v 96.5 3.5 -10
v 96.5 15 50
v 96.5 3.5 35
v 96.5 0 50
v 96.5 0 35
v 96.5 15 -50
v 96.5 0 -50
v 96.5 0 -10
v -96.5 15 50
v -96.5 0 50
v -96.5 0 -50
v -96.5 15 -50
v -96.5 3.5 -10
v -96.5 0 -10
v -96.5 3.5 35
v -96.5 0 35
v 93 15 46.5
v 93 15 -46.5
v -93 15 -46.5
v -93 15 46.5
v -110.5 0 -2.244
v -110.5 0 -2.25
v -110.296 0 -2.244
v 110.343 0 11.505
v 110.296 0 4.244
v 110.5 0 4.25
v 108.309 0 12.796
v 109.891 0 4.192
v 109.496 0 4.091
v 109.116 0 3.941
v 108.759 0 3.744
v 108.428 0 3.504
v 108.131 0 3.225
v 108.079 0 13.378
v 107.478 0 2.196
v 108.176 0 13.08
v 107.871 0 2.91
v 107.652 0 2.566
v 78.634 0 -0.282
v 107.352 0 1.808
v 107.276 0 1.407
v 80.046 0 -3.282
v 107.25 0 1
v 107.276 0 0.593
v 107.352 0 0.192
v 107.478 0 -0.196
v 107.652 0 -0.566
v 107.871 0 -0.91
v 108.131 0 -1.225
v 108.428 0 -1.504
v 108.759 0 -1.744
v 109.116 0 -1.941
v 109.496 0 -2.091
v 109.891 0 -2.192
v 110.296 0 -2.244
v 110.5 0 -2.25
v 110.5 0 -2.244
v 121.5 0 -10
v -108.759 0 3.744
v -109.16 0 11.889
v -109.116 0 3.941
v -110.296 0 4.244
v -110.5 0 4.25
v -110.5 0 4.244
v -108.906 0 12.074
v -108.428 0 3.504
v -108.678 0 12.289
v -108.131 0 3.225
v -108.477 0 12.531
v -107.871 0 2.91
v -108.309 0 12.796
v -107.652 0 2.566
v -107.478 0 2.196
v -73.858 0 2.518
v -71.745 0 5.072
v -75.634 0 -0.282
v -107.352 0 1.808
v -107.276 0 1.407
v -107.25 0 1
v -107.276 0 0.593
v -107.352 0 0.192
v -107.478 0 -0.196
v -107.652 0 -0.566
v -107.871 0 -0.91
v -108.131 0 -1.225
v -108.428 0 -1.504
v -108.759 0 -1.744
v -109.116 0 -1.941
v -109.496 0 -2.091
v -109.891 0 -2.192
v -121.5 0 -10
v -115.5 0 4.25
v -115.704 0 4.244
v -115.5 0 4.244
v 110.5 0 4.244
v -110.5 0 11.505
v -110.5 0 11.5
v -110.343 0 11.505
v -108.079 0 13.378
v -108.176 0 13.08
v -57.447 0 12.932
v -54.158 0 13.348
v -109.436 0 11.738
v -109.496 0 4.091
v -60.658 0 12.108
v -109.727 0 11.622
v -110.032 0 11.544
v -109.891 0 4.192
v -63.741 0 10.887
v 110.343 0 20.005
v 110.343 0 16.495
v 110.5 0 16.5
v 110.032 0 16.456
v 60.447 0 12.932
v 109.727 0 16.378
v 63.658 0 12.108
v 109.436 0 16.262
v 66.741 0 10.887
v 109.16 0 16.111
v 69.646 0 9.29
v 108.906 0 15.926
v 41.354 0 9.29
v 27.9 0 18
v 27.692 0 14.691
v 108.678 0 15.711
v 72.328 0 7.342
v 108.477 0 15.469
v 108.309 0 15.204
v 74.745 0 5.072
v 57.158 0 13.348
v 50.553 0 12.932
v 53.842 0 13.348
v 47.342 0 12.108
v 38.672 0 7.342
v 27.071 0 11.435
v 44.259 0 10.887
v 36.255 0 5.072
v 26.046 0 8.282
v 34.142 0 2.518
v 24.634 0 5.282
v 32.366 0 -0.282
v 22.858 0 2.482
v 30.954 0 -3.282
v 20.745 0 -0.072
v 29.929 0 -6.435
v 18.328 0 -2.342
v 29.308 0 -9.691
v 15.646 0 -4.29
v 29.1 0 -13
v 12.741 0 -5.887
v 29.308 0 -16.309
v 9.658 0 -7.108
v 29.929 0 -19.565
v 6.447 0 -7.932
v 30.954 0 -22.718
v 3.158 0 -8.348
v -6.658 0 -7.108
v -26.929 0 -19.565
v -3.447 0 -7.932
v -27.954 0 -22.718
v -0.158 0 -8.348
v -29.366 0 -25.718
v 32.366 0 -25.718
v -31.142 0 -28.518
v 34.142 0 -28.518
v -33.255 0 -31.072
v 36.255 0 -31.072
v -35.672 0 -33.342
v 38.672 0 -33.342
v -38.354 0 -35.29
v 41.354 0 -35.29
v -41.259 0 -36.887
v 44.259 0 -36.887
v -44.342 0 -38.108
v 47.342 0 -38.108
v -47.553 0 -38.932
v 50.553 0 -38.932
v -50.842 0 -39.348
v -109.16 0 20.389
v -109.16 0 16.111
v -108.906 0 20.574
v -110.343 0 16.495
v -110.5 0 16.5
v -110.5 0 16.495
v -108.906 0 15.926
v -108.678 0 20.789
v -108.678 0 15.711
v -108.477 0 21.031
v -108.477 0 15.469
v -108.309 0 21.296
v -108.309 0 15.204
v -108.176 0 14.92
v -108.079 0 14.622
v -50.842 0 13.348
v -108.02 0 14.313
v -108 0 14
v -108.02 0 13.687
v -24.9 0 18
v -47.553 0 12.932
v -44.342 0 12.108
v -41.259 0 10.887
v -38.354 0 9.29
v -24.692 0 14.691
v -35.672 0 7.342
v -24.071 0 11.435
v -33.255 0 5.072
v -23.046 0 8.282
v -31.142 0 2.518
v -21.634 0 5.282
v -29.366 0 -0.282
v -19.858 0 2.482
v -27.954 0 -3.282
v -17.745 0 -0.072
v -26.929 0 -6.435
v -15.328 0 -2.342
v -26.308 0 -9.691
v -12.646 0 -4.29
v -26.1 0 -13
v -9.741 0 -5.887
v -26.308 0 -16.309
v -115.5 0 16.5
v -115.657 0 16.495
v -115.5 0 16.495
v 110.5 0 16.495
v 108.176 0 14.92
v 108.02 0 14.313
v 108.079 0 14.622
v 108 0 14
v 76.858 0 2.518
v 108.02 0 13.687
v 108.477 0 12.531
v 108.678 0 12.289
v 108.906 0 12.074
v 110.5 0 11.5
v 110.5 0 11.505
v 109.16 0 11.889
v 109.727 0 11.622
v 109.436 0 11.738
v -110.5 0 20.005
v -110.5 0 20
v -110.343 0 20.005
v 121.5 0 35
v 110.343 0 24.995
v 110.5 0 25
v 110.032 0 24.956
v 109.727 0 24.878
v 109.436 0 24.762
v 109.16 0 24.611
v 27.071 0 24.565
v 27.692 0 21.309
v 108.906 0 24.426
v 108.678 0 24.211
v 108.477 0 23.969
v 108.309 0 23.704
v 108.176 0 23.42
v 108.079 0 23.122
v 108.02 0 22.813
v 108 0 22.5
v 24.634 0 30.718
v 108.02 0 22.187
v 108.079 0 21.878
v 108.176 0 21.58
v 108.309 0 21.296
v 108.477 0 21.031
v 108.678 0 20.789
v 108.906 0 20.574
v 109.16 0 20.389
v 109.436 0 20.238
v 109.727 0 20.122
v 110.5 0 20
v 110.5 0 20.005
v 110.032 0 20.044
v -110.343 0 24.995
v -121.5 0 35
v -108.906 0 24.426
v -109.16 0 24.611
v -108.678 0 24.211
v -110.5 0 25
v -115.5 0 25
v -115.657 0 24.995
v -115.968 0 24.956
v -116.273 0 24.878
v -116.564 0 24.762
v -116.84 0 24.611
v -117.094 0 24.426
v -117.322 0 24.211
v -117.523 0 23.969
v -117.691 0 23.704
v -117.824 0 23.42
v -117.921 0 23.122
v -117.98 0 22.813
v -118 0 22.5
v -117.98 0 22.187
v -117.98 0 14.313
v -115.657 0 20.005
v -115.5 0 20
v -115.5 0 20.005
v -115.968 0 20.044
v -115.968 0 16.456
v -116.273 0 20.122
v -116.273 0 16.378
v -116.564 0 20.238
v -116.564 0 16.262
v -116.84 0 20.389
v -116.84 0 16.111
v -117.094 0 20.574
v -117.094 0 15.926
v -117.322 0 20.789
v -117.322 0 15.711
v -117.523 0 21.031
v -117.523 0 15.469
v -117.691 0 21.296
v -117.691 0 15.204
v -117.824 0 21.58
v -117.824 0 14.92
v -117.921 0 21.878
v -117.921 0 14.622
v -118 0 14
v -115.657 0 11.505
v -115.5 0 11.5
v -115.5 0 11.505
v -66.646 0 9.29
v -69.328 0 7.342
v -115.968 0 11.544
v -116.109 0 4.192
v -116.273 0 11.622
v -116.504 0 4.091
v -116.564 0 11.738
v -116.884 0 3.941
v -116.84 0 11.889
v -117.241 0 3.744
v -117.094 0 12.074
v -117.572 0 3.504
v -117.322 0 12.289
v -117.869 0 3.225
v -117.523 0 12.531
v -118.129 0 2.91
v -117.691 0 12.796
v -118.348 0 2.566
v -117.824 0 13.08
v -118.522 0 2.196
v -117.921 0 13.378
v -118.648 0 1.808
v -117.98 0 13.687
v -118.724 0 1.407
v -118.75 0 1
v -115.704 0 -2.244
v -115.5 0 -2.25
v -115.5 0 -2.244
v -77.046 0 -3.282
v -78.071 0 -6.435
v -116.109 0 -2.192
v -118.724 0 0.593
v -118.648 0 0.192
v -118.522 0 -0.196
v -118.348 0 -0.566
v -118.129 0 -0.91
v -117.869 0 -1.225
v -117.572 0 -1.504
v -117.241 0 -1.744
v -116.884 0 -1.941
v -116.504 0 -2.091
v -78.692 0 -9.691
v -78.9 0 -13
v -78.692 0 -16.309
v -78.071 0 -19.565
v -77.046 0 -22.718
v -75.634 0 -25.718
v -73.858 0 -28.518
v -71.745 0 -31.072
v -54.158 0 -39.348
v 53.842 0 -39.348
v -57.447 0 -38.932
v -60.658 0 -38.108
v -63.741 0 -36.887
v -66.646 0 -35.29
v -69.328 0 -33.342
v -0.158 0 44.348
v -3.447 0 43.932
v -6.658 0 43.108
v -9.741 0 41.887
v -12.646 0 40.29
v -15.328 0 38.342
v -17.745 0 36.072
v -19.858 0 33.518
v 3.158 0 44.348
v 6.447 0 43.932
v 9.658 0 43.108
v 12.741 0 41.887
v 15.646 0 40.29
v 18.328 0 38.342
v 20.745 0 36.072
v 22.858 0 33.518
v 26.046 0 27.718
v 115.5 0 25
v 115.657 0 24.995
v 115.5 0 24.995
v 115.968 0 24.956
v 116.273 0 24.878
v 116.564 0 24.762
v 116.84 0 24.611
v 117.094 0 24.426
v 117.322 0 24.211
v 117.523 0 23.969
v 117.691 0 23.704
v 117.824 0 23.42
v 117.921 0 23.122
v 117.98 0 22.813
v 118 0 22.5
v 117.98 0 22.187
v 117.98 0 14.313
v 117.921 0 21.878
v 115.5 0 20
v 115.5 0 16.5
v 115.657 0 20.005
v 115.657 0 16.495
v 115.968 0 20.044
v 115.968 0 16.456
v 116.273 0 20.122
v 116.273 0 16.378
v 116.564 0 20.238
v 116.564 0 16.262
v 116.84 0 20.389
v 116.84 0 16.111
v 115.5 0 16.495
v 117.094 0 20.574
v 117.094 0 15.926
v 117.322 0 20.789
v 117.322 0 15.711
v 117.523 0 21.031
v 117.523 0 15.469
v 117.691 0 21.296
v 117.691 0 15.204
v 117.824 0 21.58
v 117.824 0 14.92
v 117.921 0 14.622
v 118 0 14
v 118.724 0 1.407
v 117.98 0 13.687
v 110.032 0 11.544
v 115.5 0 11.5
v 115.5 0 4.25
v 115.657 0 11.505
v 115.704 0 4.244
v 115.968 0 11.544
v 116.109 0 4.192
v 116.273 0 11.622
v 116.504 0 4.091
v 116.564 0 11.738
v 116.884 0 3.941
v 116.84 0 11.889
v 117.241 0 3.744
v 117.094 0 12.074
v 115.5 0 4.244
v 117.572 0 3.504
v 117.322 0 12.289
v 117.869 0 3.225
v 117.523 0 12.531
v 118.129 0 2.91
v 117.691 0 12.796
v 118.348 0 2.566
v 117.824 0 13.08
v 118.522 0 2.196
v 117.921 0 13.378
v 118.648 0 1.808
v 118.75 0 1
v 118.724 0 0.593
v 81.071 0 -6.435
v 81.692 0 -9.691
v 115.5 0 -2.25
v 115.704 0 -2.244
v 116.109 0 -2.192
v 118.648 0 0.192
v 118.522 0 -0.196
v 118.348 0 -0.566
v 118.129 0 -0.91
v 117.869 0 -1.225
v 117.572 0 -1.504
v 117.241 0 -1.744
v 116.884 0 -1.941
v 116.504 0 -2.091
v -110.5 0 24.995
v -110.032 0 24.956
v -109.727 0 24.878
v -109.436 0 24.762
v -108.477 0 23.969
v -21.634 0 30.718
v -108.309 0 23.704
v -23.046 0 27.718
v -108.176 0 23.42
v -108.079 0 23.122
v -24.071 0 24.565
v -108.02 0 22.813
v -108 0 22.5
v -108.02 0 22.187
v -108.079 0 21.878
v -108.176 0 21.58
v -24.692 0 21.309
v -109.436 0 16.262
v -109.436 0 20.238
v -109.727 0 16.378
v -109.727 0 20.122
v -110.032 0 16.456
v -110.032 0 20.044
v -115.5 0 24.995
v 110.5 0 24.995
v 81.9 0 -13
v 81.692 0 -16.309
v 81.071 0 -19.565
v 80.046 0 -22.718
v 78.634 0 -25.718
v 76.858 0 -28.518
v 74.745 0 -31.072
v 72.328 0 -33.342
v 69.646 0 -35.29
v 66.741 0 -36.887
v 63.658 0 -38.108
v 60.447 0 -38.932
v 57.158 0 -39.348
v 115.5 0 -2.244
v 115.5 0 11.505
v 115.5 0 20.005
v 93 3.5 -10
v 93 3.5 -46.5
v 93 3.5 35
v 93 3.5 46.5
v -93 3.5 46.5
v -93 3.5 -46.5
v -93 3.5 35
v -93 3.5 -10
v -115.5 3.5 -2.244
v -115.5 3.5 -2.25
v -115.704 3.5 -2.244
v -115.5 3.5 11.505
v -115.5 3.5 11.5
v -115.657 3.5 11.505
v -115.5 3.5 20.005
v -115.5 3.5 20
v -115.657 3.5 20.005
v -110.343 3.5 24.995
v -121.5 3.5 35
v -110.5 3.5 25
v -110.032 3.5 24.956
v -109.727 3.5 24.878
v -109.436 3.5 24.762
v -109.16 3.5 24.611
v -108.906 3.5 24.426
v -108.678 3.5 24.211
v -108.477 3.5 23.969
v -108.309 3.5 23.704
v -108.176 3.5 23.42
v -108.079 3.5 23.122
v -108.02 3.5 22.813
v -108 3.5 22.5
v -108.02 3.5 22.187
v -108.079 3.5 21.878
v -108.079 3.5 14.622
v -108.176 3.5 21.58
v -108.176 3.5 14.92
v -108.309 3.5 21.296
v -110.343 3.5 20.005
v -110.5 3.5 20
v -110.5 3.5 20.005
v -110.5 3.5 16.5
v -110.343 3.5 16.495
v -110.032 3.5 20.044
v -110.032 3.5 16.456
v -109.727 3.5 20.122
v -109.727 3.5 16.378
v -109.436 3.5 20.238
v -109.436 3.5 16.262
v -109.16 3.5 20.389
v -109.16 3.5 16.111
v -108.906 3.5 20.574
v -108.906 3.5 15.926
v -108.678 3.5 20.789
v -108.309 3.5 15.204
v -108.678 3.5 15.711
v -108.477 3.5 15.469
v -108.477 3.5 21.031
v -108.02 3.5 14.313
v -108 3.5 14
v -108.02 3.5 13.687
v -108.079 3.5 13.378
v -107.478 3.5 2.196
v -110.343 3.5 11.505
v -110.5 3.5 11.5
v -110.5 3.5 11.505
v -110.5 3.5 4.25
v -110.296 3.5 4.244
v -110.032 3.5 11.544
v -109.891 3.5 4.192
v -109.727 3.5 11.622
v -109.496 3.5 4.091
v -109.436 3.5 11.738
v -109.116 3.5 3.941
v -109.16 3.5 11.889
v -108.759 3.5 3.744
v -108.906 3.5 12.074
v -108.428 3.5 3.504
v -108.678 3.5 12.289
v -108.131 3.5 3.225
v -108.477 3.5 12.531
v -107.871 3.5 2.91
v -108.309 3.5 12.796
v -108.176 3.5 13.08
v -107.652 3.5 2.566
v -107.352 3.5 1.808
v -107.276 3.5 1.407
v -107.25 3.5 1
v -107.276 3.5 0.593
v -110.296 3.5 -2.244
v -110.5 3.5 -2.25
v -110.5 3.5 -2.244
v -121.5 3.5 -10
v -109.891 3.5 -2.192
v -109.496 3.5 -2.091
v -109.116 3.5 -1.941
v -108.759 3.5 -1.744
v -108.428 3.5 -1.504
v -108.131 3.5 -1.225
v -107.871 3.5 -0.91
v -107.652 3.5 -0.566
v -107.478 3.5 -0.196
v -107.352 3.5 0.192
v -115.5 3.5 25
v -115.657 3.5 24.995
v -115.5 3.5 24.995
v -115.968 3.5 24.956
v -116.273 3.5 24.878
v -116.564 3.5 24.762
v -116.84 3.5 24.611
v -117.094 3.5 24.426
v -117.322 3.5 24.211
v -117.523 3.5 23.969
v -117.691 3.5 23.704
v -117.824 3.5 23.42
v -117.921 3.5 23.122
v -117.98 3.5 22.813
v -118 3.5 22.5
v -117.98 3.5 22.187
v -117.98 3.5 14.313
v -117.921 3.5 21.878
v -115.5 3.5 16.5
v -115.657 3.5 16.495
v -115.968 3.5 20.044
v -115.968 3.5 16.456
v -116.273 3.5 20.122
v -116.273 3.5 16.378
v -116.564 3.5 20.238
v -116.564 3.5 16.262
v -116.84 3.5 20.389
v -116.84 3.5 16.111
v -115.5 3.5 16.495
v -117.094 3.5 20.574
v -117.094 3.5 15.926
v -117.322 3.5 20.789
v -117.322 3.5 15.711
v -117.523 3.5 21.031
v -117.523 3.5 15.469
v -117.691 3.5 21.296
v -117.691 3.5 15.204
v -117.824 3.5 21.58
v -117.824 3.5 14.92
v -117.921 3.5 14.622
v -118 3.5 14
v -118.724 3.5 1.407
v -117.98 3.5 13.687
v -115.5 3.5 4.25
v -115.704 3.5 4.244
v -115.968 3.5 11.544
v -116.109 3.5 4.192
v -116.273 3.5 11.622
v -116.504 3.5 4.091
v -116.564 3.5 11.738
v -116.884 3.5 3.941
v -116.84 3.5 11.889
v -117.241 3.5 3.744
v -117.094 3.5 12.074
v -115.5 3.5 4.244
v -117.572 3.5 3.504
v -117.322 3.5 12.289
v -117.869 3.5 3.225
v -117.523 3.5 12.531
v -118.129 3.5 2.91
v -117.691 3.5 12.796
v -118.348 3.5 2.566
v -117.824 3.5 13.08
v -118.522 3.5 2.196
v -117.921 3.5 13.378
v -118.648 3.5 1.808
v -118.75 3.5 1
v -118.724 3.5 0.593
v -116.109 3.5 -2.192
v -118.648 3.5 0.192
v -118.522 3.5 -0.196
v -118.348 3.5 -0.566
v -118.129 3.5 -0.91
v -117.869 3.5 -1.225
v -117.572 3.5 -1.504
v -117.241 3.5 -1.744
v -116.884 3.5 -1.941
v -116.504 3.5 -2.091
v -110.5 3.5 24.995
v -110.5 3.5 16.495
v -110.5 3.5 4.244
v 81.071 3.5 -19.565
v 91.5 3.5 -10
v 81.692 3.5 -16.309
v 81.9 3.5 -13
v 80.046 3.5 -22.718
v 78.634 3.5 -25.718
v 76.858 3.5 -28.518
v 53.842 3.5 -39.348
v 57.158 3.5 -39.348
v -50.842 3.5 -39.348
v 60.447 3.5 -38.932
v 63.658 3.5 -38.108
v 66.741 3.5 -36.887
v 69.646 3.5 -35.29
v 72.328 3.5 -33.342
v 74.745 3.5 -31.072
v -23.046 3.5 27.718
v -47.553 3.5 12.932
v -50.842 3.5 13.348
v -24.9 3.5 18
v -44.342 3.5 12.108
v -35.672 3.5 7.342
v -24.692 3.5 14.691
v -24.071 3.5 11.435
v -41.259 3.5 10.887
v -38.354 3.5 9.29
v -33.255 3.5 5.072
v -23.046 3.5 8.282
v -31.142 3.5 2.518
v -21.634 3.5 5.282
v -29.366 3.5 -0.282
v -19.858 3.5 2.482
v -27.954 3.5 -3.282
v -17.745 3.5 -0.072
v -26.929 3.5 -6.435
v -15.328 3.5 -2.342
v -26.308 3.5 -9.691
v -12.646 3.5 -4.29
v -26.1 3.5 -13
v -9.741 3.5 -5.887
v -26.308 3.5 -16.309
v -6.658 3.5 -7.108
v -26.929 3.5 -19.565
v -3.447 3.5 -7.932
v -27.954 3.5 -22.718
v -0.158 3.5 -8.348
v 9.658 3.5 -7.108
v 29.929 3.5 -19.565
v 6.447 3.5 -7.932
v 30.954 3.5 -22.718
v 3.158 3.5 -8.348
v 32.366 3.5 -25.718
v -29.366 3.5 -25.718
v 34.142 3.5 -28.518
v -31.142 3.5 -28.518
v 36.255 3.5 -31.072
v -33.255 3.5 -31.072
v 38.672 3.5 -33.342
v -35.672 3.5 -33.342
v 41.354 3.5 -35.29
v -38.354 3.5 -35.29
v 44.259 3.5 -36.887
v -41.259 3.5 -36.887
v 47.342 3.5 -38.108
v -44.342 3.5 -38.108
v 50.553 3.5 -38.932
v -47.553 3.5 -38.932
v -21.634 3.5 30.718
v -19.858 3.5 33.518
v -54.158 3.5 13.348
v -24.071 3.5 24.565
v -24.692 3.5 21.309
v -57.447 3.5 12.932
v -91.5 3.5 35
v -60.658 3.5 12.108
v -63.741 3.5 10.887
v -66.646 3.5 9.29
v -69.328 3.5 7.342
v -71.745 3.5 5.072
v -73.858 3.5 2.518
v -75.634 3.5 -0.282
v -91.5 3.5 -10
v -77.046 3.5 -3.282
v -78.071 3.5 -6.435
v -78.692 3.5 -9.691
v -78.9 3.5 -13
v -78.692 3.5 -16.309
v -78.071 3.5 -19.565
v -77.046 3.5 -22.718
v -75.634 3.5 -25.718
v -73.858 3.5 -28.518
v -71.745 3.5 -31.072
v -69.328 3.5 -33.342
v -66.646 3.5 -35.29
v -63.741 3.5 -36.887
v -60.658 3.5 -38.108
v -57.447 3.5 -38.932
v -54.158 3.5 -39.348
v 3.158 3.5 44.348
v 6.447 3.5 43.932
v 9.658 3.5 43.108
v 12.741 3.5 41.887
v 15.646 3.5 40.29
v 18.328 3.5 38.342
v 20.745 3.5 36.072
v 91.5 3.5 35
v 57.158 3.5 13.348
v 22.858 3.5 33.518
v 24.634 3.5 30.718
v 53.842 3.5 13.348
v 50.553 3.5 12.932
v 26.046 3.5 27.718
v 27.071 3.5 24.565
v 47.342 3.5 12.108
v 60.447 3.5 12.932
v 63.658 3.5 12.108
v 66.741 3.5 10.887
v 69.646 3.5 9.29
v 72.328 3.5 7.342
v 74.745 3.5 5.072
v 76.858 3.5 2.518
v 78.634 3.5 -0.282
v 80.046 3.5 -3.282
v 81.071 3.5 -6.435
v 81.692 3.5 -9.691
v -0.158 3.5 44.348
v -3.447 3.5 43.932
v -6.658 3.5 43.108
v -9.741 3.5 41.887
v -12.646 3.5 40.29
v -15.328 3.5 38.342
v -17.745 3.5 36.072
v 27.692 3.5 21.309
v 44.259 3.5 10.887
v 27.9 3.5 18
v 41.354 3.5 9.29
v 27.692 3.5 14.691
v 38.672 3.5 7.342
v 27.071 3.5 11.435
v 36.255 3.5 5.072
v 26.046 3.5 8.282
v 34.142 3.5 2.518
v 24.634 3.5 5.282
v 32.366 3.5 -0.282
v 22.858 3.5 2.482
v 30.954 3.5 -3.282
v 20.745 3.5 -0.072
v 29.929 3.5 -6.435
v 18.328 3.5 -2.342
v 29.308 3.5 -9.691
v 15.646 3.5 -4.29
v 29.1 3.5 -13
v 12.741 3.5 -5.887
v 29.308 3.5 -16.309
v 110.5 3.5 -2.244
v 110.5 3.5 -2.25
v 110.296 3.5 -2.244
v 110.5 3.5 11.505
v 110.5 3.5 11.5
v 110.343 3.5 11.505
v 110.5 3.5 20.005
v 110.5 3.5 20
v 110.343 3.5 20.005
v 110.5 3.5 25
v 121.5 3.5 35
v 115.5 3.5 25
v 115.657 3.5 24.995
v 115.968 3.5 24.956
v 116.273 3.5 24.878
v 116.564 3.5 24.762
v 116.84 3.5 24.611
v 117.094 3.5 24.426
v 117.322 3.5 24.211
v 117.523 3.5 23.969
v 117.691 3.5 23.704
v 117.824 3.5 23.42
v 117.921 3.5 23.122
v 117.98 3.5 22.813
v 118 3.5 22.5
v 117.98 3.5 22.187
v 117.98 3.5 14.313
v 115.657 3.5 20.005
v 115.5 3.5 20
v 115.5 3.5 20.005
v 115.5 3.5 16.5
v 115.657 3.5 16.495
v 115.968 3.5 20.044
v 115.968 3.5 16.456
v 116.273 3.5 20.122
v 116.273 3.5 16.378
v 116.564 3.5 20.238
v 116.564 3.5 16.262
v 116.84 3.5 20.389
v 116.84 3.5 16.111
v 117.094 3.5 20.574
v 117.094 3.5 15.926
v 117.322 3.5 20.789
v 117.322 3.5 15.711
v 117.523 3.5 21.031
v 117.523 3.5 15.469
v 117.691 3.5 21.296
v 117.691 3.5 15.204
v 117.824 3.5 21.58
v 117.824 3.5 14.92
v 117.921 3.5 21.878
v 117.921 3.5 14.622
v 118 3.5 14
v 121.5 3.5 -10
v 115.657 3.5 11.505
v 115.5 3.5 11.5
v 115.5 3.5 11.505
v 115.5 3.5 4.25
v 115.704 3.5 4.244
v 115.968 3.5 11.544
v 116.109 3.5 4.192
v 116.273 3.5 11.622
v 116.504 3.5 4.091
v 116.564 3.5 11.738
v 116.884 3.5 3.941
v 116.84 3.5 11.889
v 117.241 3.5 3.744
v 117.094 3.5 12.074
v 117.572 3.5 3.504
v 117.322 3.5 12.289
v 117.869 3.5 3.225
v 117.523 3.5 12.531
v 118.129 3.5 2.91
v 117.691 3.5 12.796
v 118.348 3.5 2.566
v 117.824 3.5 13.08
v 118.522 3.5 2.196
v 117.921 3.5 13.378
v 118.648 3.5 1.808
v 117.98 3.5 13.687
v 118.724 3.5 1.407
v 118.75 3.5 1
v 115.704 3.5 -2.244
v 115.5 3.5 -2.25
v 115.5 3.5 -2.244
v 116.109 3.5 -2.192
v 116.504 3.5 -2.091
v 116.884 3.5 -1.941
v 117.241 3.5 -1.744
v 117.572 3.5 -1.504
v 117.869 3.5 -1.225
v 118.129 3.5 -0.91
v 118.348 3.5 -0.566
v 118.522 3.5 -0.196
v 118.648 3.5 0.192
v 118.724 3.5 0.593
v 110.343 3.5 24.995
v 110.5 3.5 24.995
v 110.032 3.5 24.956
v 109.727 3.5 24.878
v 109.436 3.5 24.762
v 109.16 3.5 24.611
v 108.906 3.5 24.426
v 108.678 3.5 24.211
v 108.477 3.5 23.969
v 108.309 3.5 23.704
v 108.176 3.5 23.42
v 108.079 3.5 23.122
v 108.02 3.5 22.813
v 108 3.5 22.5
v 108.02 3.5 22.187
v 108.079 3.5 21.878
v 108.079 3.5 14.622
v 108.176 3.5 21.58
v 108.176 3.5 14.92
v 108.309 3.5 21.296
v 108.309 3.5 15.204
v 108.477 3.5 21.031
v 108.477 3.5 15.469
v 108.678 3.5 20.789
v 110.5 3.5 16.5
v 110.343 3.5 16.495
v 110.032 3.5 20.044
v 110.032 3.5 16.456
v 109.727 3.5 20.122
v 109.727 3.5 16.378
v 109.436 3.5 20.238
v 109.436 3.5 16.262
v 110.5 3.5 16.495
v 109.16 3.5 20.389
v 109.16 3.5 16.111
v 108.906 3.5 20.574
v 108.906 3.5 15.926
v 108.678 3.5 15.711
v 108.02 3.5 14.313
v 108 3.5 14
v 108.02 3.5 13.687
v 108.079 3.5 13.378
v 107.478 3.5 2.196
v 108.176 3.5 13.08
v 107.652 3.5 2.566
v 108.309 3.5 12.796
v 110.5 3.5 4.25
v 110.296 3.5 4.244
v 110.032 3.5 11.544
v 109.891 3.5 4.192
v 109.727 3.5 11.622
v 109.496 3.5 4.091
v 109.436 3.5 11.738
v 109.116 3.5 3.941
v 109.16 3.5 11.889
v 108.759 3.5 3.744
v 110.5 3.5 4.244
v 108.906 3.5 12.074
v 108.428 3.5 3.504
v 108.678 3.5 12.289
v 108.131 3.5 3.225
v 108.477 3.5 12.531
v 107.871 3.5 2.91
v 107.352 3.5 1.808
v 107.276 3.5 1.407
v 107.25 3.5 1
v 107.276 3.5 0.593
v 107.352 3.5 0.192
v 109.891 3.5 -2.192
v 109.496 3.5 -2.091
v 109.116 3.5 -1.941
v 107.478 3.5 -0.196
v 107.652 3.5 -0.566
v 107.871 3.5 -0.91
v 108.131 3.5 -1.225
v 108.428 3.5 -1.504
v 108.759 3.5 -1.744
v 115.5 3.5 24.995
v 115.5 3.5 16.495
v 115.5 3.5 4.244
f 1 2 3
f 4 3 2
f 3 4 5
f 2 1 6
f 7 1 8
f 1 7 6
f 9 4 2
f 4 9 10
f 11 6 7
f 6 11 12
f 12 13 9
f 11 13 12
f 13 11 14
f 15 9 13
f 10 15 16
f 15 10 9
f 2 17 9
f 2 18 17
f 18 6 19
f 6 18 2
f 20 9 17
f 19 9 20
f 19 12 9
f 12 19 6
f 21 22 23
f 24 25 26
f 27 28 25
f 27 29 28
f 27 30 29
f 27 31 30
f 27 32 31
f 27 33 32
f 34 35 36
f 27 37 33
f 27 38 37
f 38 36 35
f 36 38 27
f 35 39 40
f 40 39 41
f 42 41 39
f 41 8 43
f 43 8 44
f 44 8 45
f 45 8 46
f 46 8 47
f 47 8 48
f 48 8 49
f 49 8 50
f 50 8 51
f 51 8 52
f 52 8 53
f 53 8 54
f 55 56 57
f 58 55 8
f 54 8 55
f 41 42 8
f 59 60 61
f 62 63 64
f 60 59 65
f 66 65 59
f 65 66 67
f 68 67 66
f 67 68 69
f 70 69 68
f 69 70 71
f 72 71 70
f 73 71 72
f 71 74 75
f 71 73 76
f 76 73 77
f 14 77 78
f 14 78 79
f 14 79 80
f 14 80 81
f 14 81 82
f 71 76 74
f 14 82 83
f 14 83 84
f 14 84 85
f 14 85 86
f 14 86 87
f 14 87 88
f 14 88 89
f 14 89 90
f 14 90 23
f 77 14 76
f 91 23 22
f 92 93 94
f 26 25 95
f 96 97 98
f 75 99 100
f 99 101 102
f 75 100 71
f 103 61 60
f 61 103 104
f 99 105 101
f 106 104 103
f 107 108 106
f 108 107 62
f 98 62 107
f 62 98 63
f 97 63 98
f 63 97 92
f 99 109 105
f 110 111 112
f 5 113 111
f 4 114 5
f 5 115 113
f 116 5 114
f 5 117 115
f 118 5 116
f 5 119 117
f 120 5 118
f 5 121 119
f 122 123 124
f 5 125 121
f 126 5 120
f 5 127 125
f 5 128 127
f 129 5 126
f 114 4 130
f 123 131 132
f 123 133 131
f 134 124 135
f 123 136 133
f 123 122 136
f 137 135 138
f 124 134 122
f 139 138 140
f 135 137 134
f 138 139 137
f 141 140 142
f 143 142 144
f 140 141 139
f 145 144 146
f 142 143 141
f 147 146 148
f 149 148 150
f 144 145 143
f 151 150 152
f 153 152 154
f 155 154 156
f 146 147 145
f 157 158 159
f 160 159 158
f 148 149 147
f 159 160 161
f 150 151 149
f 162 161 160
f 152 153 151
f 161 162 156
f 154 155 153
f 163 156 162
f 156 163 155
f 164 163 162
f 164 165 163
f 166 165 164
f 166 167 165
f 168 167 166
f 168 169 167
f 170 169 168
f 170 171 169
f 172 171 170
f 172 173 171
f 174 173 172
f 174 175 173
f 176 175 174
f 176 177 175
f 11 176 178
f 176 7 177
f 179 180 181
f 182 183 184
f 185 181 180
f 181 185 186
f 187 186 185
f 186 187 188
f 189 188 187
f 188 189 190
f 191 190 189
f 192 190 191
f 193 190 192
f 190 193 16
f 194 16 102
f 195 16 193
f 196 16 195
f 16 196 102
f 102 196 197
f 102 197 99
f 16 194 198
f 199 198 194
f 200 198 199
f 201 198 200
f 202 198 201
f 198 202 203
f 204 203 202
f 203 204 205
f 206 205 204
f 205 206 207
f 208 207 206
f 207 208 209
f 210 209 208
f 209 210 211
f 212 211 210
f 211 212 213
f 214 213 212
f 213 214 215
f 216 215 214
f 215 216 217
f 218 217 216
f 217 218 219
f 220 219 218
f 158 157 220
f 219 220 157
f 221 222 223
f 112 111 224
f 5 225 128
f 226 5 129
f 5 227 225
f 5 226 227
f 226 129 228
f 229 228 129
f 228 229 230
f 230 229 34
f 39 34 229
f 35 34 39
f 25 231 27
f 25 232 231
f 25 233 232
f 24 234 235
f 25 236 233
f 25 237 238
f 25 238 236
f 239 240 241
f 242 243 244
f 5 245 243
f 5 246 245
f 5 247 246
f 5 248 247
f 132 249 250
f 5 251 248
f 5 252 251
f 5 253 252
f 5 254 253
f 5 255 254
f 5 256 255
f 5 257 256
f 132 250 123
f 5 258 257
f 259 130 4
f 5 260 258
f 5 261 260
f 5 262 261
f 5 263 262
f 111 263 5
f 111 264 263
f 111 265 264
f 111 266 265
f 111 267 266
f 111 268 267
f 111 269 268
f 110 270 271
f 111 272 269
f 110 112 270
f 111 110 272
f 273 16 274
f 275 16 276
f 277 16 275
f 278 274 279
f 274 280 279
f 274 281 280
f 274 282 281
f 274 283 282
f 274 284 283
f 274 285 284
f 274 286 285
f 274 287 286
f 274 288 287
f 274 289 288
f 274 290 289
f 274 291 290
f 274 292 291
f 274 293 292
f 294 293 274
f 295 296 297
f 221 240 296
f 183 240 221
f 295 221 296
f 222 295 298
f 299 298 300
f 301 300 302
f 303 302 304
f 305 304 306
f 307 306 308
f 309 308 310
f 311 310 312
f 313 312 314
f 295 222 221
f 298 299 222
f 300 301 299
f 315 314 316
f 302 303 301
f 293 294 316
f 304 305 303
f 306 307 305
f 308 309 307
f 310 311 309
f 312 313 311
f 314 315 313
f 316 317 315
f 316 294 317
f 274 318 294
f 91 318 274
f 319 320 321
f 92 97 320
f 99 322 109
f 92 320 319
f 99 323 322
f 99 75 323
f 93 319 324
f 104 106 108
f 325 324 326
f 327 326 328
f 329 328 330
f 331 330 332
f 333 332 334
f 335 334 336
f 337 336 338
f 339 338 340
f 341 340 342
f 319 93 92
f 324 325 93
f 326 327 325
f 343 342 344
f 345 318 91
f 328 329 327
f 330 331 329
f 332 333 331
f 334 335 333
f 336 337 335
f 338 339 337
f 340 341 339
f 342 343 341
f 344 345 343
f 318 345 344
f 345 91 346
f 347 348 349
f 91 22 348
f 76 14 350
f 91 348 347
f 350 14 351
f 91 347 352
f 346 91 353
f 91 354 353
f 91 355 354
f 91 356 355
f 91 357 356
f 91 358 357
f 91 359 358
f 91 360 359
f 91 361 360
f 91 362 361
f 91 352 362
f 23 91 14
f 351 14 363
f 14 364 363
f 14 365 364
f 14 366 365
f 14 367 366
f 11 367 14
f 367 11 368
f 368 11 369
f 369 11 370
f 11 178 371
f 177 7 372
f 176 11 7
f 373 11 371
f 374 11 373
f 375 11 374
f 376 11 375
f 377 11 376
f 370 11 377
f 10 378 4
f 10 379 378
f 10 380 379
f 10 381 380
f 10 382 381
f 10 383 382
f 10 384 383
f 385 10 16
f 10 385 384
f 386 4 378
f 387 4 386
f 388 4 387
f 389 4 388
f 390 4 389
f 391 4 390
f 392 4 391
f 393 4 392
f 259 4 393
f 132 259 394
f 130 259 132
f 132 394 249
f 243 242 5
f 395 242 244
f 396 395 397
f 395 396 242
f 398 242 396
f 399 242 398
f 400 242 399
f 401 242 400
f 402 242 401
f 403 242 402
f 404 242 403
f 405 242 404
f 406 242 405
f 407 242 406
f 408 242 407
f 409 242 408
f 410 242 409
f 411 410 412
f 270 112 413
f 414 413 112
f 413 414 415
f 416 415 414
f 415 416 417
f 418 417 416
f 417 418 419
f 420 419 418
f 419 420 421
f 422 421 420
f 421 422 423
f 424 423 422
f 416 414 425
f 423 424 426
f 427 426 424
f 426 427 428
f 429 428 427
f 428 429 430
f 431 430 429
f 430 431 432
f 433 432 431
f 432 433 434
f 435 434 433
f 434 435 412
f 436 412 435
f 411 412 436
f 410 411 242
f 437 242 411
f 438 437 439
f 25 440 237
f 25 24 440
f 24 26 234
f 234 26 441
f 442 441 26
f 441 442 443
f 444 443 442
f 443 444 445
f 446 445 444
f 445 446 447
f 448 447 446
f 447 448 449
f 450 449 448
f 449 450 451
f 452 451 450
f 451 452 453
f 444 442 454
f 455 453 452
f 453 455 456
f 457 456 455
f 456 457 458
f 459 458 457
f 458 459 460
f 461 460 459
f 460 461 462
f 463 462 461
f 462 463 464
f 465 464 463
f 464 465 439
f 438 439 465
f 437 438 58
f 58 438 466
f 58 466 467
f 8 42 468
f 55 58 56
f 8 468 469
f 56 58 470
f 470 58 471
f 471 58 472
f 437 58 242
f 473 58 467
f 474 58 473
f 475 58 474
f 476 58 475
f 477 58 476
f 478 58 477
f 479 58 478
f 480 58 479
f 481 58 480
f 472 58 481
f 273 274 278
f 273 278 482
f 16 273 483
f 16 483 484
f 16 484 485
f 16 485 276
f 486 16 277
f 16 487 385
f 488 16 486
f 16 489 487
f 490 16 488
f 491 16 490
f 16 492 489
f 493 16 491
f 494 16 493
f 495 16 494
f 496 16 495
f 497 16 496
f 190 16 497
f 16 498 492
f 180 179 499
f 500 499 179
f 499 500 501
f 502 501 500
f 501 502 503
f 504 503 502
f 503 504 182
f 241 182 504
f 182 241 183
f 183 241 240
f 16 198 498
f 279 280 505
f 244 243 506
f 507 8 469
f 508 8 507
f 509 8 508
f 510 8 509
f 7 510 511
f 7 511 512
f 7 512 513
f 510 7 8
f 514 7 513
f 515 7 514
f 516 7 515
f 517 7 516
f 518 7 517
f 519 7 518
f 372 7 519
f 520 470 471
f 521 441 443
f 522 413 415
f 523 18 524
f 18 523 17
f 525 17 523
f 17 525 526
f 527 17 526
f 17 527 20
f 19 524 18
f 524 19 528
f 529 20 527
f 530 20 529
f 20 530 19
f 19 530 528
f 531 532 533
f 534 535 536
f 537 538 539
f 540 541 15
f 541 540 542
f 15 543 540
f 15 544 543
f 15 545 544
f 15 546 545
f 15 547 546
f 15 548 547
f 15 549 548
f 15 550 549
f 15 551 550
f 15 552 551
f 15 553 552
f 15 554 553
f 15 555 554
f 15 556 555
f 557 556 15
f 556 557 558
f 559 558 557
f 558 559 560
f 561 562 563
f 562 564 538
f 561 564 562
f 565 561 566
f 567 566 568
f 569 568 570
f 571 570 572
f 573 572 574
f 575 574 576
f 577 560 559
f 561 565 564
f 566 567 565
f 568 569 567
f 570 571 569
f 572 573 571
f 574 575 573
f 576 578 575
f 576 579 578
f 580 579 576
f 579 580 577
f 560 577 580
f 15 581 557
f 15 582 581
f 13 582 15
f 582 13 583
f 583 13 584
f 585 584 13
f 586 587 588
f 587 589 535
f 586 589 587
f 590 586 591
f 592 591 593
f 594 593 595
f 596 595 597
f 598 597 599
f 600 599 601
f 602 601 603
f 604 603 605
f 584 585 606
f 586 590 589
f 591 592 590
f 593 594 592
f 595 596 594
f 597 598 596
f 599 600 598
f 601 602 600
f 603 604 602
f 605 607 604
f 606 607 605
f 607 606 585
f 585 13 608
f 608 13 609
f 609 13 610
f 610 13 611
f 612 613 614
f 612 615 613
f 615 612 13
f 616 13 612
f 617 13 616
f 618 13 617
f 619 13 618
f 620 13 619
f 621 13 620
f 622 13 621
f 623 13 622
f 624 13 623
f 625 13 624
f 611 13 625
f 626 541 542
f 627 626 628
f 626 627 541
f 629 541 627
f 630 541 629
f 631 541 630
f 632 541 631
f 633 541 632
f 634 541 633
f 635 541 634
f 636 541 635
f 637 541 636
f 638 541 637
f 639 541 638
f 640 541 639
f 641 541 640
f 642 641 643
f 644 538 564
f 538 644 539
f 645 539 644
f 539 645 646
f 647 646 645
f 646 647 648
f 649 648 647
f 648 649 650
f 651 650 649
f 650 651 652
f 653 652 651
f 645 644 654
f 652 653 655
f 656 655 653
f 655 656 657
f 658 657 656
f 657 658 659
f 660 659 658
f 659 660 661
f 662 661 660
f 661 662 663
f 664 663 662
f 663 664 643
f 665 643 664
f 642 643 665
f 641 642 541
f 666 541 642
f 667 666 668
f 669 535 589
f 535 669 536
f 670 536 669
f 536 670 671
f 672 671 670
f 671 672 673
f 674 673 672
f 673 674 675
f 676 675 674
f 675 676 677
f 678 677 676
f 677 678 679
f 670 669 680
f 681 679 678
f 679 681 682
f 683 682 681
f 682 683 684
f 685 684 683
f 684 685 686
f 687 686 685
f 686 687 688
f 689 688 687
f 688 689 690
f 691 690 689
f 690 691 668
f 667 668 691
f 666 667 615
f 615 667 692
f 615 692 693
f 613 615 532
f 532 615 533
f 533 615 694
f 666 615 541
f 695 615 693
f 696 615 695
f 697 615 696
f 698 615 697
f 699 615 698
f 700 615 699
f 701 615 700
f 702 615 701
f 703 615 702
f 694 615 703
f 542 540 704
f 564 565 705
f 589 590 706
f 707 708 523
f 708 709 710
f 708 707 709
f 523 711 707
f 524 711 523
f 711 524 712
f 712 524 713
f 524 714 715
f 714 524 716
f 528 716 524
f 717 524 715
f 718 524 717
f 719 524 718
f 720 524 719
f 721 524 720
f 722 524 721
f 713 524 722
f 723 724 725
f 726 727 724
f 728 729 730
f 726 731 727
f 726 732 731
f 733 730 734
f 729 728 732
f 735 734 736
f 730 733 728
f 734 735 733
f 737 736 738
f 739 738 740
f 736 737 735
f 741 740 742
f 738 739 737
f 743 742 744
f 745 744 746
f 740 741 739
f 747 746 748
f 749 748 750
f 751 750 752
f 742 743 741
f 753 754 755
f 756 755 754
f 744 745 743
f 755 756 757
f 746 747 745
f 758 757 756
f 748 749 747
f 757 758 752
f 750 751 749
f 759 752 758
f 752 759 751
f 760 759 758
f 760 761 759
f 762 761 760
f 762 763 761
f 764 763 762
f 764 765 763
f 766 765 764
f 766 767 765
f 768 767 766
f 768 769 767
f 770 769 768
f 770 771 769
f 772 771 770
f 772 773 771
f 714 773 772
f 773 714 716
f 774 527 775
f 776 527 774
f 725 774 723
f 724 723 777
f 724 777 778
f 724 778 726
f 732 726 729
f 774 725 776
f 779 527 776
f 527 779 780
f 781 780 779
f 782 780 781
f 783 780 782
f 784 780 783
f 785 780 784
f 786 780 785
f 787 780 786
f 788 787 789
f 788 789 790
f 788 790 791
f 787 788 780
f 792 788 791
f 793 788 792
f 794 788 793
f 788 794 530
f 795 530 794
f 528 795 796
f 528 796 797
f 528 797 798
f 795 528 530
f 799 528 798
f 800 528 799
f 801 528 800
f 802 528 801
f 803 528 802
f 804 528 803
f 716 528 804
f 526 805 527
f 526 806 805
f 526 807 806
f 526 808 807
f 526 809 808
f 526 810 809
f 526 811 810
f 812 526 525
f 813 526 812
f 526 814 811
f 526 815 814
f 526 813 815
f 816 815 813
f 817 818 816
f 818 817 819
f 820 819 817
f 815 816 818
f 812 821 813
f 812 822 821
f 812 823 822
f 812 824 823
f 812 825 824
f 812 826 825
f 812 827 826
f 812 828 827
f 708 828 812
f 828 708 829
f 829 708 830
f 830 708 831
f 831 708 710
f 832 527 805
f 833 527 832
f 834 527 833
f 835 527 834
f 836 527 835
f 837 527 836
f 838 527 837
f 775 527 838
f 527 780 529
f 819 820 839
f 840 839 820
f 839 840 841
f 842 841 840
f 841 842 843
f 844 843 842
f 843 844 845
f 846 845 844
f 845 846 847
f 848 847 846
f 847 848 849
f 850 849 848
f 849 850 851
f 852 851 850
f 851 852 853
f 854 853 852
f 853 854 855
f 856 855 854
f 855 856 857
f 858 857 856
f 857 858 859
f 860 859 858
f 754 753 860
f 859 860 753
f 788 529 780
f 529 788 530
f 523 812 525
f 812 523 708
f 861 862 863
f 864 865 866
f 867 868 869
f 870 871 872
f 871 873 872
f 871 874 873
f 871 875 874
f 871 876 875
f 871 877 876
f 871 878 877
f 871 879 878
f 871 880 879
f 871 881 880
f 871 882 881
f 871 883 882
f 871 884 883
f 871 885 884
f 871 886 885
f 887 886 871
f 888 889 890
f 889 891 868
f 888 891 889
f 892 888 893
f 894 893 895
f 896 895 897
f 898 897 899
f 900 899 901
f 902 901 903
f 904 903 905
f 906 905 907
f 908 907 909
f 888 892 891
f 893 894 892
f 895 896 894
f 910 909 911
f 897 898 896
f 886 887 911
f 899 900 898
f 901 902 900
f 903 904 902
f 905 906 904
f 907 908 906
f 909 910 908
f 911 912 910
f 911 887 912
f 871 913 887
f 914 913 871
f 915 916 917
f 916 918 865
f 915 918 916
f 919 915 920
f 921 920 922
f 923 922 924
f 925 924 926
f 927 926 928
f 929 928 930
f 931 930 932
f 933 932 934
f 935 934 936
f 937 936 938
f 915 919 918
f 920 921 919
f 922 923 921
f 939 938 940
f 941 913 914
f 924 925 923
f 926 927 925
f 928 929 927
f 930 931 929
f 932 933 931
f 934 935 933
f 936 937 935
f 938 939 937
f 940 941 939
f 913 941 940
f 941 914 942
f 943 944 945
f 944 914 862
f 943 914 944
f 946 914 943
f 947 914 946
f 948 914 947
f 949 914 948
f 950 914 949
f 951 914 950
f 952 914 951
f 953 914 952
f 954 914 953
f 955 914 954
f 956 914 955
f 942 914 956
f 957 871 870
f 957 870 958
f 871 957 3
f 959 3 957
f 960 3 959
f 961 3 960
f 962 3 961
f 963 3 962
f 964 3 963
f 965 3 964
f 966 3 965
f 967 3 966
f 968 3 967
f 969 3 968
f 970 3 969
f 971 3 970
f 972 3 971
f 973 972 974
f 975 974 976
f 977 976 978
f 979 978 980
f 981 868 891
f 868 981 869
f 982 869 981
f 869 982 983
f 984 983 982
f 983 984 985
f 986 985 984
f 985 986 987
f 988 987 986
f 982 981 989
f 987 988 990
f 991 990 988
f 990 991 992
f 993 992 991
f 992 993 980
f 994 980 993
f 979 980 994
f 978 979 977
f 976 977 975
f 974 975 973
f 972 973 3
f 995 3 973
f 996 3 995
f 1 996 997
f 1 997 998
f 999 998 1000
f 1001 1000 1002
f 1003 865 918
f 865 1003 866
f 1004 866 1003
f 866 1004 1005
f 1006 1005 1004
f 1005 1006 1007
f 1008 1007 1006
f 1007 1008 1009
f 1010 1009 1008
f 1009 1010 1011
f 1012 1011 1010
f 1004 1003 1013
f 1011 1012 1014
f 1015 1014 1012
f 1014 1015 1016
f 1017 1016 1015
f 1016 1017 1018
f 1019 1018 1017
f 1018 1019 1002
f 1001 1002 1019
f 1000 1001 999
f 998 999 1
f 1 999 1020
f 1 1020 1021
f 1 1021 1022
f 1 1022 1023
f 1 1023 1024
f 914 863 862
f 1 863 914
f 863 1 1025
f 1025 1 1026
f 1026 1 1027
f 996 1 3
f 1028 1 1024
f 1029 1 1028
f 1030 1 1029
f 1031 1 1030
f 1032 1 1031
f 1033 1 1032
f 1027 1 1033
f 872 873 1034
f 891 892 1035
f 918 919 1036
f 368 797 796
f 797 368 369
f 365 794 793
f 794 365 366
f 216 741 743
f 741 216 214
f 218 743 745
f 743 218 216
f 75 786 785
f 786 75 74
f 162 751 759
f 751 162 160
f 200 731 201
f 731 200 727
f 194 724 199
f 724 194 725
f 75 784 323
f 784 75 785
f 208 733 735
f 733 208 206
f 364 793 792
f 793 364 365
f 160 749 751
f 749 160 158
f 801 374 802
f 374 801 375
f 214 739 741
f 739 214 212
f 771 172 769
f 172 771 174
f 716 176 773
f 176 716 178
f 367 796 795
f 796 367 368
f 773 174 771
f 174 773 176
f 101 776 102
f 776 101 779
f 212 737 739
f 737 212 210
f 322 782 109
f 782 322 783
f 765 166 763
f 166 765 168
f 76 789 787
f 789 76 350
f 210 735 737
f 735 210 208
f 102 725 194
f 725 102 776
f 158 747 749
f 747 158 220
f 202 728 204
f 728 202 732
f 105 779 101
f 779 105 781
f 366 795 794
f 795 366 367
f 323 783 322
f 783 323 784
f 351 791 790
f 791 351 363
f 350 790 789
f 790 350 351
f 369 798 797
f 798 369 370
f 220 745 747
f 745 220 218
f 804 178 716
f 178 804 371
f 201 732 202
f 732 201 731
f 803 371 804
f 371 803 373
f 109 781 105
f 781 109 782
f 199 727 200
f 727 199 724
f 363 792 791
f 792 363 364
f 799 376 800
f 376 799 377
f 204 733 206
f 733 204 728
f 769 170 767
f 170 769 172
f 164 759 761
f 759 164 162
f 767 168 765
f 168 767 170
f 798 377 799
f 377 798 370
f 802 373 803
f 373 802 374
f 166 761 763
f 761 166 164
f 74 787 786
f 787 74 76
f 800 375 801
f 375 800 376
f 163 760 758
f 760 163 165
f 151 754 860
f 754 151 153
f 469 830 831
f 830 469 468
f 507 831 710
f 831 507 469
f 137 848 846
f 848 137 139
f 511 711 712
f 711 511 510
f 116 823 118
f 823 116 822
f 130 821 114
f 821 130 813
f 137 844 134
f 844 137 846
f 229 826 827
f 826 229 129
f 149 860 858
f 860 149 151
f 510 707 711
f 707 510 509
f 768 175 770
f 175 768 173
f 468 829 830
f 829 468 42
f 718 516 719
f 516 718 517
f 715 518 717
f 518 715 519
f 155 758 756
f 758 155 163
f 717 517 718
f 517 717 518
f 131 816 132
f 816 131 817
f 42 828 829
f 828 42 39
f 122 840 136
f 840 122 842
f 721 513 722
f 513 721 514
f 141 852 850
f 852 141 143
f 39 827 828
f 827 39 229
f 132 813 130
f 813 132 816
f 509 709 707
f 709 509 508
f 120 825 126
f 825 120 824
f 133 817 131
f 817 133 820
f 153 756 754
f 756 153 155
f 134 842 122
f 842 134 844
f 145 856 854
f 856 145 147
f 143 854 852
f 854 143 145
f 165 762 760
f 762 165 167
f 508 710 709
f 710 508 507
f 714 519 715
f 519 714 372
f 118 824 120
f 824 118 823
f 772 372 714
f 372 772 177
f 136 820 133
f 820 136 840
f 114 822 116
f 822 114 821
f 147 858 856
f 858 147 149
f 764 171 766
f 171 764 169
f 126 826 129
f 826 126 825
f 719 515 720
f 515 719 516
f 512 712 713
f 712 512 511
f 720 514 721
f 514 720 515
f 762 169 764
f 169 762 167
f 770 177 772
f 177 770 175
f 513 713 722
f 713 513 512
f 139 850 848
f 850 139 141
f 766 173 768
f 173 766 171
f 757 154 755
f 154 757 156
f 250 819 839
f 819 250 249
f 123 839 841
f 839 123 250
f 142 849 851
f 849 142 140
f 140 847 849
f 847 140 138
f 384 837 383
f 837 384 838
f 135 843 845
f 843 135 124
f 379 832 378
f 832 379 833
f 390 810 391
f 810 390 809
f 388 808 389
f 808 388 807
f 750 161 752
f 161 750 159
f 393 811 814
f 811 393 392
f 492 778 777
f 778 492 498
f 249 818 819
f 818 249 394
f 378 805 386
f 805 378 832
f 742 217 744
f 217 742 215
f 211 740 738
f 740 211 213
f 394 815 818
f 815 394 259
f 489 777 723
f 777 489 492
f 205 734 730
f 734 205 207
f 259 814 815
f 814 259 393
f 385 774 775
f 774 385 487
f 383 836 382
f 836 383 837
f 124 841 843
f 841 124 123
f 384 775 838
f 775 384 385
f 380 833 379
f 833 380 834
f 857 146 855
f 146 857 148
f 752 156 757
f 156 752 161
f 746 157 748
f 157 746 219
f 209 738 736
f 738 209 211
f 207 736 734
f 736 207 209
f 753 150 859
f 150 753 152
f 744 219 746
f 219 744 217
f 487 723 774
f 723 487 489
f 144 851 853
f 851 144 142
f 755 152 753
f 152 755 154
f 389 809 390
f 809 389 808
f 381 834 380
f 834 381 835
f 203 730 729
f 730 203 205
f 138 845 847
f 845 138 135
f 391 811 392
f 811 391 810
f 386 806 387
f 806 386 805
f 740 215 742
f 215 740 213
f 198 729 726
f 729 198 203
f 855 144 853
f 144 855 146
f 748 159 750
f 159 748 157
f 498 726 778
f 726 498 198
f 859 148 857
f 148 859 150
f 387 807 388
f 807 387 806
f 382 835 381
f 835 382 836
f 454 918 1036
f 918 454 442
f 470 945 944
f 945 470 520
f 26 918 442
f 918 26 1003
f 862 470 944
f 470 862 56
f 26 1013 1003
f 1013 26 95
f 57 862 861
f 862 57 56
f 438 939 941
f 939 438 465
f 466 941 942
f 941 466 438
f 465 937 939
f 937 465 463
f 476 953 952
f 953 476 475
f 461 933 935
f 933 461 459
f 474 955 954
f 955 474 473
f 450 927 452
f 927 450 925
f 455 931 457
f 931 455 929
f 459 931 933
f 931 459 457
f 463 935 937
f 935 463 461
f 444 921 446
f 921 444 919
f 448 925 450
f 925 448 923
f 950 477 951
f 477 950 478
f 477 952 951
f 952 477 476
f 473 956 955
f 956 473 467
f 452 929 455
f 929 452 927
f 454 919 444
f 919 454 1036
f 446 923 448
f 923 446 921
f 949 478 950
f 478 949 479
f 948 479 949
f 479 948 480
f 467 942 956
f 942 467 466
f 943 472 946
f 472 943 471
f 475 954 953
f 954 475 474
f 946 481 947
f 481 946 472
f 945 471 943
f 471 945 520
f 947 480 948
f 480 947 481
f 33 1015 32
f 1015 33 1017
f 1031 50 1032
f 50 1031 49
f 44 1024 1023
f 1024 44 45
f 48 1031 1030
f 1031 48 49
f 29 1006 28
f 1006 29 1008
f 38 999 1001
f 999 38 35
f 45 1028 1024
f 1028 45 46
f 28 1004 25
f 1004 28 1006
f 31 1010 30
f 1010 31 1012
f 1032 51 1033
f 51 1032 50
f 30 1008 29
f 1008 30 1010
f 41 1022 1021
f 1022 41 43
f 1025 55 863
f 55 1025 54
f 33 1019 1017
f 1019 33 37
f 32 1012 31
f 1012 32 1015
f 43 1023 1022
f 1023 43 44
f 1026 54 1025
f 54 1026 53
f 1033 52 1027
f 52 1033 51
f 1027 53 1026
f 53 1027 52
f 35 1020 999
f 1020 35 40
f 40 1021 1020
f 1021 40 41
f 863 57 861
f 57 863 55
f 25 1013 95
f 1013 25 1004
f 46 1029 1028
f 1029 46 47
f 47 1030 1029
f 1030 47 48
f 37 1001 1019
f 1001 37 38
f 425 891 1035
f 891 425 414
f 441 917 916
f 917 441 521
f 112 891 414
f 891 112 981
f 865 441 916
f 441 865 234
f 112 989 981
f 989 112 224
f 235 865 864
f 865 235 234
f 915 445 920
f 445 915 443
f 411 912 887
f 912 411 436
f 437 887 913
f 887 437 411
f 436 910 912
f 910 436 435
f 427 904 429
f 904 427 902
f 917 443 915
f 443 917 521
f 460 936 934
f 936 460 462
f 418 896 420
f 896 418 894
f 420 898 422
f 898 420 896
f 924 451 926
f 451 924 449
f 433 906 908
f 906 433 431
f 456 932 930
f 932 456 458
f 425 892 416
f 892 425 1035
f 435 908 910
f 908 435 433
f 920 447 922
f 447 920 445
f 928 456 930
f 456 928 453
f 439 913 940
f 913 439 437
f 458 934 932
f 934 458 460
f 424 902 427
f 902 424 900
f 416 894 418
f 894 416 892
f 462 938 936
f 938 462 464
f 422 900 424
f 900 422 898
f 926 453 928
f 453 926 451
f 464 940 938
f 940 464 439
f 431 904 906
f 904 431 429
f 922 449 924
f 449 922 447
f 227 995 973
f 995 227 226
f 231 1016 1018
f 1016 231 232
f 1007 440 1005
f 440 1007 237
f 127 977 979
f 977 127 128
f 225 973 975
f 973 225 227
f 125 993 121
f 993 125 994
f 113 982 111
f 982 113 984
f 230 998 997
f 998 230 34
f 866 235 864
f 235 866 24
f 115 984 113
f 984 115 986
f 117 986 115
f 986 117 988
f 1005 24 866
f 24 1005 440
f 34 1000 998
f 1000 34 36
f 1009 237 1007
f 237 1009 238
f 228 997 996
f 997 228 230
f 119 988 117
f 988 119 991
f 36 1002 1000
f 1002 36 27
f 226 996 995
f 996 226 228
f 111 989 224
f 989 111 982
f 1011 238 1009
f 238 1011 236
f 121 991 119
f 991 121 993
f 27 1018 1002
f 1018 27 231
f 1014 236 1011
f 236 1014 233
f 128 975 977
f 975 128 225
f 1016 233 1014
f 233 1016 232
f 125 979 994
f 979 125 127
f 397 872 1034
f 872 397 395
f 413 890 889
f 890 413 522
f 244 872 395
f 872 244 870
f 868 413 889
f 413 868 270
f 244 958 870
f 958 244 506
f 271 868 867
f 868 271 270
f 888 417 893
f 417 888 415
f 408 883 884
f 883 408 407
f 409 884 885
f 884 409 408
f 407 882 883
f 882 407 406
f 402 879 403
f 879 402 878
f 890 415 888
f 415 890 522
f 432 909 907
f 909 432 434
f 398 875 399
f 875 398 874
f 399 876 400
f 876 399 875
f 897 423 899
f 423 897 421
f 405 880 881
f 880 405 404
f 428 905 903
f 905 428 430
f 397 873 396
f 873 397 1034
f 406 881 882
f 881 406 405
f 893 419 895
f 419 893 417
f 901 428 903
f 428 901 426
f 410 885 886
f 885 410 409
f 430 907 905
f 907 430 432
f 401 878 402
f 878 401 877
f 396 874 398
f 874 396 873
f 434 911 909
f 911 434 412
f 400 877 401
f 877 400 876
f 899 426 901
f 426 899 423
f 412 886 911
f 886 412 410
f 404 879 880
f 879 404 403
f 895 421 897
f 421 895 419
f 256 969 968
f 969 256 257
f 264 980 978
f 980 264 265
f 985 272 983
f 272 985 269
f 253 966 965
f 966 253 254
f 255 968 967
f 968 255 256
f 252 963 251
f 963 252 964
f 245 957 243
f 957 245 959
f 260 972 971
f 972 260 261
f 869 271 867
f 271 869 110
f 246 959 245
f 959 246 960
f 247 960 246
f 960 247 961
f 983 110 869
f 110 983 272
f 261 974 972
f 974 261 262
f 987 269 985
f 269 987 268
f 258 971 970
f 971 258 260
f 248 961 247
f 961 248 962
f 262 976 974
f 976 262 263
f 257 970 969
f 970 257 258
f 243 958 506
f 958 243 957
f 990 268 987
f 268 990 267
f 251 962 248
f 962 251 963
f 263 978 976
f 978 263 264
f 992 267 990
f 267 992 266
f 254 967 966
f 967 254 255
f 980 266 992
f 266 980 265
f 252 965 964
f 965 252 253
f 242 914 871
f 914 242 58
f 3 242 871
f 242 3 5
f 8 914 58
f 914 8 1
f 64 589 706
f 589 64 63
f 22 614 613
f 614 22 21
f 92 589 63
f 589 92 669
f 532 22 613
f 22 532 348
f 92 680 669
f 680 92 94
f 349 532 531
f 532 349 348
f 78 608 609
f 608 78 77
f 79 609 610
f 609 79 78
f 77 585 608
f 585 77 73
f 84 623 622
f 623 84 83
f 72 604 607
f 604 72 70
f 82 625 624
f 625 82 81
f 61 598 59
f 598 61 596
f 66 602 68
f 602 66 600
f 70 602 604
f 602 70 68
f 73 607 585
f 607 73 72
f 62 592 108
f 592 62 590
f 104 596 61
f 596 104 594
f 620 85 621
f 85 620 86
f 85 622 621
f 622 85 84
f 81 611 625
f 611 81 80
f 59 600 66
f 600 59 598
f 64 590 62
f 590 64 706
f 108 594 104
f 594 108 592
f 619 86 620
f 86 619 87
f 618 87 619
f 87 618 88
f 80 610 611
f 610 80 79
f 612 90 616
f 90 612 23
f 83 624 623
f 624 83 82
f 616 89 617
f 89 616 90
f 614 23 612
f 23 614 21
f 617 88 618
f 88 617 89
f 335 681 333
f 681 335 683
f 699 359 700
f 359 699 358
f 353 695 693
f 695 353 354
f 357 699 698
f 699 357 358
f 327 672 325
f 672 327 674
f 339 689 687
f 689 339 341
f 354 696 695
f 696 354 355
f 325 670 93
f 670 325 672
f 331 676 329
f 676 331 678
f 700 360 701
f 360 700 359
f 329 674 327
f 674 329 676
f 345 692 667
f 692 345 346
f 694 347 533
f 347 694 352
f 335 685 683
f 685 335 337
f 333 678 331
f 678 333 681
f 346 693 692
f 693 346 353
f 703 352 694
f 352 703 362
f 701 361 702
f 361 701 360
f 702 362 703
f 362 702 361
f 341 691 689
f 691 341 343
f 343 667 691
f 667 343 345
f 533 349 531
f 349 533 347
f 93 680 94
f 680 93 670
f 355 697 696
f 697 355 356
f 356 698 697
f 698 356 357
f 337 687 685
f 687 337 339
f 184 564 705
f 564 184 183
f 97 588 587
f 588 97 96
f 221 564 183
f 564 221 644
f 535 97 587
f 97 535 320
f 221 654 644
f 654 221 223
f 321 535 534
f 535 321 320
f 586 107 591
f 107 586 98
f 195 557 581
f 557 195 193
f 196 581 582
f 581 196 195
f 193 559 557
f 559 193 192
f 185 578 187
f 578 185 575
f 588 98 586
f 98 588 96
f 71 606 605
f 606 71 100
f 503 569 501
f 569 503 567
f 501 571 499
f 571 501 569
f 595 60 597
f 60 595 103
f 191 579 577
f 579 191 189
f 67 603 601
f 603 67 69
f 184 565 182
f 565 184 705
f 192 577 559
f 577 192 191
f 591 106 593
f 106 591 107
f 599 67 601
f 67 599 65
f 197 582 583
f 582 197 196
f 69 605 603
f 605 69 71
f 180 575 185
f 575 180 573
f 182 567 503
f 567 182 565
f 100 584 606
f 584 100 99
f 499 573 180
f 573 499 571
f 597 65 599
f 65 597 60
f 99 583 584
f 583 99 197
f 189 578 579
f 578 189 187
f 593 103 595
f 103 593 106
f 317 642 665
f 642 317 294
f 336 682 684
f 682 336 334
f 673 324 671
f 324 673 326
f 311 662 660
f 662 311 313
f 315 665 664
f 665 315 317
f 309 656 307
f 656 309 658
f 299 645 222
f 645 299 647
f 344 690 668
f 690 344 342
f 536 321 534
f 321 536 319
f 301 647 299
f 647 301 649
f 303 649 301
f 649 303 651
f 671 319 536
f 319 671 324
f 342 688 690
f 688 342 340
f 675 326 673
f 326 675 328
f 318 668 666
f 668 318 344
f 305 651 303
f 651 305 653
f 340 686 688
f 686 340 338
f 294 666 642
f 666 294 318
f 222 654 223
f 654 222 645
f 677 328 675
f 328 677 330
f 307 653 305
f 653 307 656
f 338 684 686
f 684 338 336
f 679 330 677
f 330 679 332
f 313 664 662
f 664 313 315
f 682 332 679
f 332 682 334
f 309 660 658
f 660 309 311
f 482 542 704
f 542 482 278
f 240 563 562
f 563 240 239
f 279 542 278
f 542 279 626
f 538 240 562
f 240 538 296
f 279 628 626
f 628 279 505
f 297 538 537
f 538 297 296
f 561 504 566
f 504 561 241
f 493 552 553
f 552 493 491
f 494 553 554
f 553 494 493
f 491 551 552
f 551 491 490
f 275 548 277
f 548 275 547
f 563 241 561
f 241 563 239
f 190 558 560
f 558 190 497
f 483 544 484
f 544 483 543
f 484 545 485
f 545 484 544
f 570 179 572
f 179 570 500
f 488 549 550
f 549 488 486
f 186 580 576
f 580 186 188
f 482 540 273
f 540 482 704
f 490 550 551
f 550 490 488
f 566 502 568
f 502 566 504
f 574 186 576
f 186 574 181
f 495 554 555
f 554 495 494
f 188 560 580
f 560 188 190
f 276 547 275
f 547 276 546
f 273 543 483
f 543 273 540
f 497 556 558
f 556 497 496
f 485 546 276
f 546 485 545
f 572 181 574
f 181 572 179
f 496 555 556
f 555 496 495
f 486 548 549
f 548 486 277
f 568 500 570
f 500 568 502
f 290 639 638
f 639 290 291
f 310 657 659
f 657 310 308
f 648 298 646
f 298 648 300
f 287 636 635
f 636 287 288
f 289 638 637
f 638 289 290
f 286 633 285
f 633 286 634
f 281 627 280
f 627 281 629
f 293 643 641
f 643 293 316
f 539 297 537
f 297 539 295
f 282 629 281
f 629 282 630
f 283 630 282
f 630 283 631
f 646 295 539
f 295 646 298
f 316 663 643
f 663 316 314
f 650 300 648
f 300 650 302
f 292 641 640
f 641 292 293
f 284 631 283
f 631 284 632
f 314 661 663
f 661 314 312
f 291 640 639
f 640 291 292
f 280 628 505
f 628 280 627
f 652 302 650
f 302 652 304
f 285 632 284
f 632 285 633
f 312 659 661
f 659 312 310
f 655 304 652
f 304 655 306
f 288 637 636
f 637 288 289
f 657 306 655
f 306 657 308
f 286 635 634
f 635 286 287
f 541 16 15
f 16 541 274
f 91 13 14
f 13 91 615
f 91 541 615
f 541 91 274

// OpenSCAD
gaugeDiameter = 52.8; // 52.4 was too small
gaugeRadius = gaugeDiameter / 2;

module gauge() {
    rotate([90, 0, 0]) {
    cylinder (r = gaugeRadius, h = 20, center = true);
    //cylinder (r = 31, h = 10, center = true);
    }
}

module gauges() {
    color("red") {
        translate([1.5, 0, -16]) {
                
            translate([-54, 0, 3]) 
            gauge();
            
            translate([54, 0, 3])
            gauge();
                
            translate([0, 0, 34])
            gauge();
        }
    }
}


$fn = 50;

// width = left to right
// depth = front to back
// height = top to bottom

boxInsideWidth = 186;
boxDepth = 15;
earWidth = 30;
earThickness = 3.5;
earHeight = 45;
overallWidth = boxInsideWidth + 2 * earWidth;

boxInsideHeight = 93;
boxWallThickness = 3.5;
boxOutsideHeight = (boxWallThickness * 2) + boxInsideHeight;

// boxOutsideWidth = 183;
boxOutsideWidth = (boxWallThickness * 2) + boxInsideWidth;


//gaugeD = 52.8; // 52.4 was too small
//gaugeR = gaugeD / 2;

slotWidth = 5;


module box()
{
    translate([0, boxDepth / 2, 0])    
    {
        difference ()
        {
            cube([boxOutsideWidth, boxDepth, boxOutsideHeight], center = true);
            translate([0, boxWallThickness, 0])
            cube([boxInsideWidth, boxDepth, boxInsideHeight], center = true);
        }
    }
}

module ear(y, slotX)
{
    difference() {
        translate([0, earThickness / 2, 0])    
            cube([earWidth, earThickness, earHeight], center = true);
        
        a = -y + 1 ; //-y + boxOutsidthHeight / 2 - 55;
        translate([slotX, 0, -y + 1])
        {
            // bottom slot
            union () {
                cube([slotWidth, 20, 6.5], center = true);
                translate([slotWidth/2, 0, 0])
                    rotate([90, 0, 0])
                        cylinder(h = 20, r = 3.25, center = true);
                translate([-slotWidth/2, 0, 0])
                    rotate([90, 0, 0])
                    cylinder(h = 20, r = 3.25, center = true);
            }

            // middle slot (used on right side)
            translate([0, 0, 13])
            union () {
                cube([slotWidth, 20, 5], center = true);
                translate([slotWidth/2, 0, 0])
                    rotate([90, 0, 0])
                        cylinder(h = 20, r = 2.5, center = true);
                translate([-slotWidth/2, 0, 0])
                    rotate([90, 0, 0])
                    cylinder(h = 20, r = 2.5, center = true);
            }

            // top slot (used on left side)
            translate([0, 0, 21.5])
            union () {
                cube([slotWidth, 20, 5], center = true);
                translate([slotWidth/2, 0, 0])
                    rotate([90, 0, 0])
                        cylinder(h = 20, r = 2.5, center = true);
                translate([-slotWidth/2, 0, 0])
                    rotate([90, 0, 0])
                    cylinder(h = 20, r = 2.5, center = true);
            }
        }        
    }
}



color("yellow") {
    difference() {
        box();
        gauges();
    }

    // Ear position is fixed regardless of box size
    earX = 183 / 2 + earWidth / 2;
    earSlotX = 6.5;
    earY = boxOutsideHeight / 2 - earHeight / 2 - 15;
    
    translate([earX, 0, earY])
        ear(earY, earSlotX);
    translate([-earX, 0, earY])
        ear(earY, -earSlotX);
}
